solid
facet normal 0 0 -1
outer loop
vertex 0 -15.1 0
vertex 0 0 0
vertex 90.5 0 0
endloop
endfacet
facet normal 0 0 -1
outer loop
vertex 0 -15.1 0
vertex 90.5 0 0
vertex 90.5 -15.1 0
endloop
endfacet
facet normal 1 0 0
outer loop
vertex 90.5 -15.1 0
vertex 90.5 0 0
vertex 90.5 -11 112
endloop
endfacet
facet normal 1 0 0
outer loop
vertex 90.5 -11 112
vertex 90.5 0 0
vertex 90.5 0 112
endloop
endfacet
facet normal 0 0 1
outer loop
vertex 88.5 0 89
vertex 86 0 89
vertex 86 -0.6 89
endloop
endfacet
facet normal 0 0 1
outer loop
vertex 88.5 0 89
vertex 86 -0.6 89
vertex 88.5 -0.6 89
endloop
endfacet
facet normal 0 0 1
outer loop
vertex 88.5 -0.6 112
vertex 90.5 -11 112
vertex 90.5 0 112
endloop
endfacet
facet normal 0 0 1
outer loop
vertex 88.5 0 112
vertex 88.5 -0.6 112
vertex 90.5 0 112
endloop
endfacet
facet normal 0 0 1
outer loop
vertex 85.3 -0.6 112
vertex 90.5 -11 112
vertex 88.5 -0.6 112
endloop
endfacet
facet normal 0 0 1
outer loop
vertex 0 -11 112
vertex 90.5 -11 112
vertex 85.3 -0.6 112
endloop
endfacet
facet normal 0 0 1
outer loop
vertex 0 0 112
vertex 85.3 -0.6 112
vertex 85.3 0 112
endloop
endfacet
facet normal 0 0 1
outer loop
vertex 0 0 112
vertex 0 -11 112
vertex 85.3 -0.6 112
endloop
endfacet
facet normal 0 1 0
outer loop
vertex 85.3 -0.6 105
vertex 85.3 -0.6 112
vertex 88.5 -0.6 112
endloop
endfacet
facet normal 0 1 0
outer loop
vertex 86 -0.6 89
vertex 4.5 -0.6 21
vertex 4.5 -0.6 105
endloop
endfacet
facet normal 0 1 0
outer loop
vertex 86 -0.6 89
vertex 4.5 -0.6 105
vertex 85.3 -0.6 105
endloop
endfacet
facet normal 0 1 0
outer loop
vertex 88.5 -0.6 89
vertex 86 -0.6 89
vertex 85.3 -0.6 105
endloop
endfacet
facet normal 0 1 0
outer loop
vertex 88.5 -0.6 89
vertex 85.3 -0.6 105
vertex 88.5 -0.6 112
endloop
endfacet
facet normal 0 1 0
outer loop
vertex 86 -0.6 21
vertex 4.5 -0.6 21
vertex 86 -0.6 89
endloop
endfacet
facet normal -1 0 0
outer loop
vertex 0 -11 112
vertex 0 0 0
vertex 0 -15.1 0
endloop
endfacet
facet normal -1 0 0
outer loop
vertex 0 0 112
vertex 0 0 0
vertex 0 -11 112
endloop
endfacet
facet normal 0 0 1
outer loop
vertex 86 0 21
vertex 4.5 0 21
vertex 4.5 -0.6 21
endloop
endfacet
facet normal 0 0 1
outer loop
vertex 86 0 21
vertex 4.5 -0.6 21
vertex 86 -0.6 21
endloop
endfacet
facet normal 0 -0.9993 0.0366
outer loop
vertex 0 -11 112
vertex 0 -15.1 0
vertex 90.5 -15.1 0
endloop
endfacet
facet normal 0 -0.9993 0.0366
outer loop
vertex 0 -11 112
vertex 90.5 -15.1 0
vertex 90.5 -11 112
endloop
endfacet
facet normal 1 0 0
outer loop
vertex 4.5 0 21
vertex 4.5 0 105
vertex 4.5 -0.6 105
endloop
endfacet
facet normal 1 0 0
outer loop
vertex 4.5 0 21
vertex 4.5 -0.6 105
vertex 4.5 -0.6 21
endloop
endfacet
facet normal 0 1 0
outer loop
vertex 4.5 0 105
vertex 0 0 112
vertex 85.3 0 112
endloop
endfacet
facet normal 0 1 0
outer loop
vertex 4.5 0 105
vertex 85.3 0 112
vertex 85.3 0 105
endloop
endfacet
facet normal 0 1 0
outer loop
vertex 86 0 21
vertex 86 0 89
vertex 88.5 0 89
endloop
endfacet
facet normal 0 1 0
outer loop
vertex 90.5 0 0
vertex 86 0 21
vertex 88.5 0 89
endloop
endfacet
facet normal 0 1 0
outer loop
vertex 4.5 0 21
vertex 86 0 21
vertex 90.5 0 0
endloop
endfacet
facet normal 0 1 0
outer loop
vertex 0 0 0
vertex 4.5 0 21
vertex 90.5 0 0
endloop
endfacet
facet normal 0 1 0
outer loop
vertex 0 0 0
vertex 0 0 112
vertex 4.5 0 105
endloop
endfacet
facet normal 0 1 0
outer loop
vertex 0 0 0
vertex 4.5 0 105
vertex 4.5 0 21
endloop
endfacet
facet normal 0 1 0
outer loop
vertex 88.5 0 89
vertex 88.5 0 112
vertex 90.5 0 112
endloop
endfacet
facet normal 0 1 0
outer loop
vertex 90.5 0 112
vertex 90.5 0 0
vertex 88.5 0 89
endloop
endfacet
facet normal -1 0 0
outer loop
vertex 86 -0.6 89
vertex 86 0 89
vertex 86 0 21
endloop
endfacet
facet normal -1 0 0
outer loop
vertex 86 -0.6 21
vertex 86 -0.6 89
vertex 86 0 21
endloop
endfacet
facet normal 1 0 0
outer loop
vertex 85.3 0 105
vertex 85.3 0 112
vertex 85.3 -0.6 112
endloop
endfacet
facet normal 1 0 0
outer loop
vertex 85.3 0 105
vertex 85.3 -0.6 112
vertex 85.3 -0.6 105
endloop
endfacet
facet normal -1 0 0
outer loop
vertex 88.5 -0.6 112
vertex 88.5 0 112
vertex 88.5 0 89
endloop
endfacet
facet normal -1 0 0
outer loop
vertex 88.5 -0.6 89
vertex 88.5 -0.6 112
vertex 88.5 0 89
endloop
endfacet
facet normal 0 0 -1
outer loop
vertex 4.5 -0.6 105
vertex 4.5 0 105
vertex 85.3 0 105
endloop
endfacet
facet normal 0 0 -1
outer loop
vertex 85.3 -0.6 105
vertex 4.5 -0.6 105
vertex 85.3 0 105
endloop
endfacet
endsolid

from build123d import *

# Parameters (mm, degrees)
EXTRUDE_1_DEPTH     = 90.5
SKETCH_2_W          = 81.5
SKETCH_2_H          = 84
CUT_EXTRUDE_1_DEPTH = 0.6
SKETCH_3_W          = 3.2
SKETCH_3_H          = 23
CUT_EXTRUDE_2_DEPTH = 0.6


with BuildPart() as part:
    # 草图1 → 凸台-拉伸1 (new body)
    with BuildSketch(Plane(origin=(0, 0, 0), x_dir=(0, 0, -1), z_dir=(1, 0, 0))):
        Polygon((0, 0), (0, -15.1), (-112, -11), (-112, 0), align=None)
    extrude(amount=EXTRUDE_1_DEPTH)

    # 草图2 → 切除-拉伸1 (cut)
    with BuildSketch(Plane(origin=(0, 0, 0), x_dir=(1, 0, 0), z_dir=(0, 1, 0))):
        with Locations((45.25, -63)):
            Rectangle(SKETCH_2_W, SKETCH_2_H)
    extrude(amount=-CUT_EXTRUDE_1_DEPTH, mode=Mode.SUBTRACT)

    # 草图3 → 切除-拉伸2 (cut)
    with BuildSketch(Plane(origin=(0, 0, 0), x_dir=(1, 0, 0), z_dir=(0, 1, 0))):
        with Locations((86.9, -100.5)):
            Rectangle(SKETCH_3_W, SKETCH_3_H)
    extrude(amount=-CUT_EXTRUDE_2_DEPTH, mode=Mode.SUBTRACT)


solid = part.part
